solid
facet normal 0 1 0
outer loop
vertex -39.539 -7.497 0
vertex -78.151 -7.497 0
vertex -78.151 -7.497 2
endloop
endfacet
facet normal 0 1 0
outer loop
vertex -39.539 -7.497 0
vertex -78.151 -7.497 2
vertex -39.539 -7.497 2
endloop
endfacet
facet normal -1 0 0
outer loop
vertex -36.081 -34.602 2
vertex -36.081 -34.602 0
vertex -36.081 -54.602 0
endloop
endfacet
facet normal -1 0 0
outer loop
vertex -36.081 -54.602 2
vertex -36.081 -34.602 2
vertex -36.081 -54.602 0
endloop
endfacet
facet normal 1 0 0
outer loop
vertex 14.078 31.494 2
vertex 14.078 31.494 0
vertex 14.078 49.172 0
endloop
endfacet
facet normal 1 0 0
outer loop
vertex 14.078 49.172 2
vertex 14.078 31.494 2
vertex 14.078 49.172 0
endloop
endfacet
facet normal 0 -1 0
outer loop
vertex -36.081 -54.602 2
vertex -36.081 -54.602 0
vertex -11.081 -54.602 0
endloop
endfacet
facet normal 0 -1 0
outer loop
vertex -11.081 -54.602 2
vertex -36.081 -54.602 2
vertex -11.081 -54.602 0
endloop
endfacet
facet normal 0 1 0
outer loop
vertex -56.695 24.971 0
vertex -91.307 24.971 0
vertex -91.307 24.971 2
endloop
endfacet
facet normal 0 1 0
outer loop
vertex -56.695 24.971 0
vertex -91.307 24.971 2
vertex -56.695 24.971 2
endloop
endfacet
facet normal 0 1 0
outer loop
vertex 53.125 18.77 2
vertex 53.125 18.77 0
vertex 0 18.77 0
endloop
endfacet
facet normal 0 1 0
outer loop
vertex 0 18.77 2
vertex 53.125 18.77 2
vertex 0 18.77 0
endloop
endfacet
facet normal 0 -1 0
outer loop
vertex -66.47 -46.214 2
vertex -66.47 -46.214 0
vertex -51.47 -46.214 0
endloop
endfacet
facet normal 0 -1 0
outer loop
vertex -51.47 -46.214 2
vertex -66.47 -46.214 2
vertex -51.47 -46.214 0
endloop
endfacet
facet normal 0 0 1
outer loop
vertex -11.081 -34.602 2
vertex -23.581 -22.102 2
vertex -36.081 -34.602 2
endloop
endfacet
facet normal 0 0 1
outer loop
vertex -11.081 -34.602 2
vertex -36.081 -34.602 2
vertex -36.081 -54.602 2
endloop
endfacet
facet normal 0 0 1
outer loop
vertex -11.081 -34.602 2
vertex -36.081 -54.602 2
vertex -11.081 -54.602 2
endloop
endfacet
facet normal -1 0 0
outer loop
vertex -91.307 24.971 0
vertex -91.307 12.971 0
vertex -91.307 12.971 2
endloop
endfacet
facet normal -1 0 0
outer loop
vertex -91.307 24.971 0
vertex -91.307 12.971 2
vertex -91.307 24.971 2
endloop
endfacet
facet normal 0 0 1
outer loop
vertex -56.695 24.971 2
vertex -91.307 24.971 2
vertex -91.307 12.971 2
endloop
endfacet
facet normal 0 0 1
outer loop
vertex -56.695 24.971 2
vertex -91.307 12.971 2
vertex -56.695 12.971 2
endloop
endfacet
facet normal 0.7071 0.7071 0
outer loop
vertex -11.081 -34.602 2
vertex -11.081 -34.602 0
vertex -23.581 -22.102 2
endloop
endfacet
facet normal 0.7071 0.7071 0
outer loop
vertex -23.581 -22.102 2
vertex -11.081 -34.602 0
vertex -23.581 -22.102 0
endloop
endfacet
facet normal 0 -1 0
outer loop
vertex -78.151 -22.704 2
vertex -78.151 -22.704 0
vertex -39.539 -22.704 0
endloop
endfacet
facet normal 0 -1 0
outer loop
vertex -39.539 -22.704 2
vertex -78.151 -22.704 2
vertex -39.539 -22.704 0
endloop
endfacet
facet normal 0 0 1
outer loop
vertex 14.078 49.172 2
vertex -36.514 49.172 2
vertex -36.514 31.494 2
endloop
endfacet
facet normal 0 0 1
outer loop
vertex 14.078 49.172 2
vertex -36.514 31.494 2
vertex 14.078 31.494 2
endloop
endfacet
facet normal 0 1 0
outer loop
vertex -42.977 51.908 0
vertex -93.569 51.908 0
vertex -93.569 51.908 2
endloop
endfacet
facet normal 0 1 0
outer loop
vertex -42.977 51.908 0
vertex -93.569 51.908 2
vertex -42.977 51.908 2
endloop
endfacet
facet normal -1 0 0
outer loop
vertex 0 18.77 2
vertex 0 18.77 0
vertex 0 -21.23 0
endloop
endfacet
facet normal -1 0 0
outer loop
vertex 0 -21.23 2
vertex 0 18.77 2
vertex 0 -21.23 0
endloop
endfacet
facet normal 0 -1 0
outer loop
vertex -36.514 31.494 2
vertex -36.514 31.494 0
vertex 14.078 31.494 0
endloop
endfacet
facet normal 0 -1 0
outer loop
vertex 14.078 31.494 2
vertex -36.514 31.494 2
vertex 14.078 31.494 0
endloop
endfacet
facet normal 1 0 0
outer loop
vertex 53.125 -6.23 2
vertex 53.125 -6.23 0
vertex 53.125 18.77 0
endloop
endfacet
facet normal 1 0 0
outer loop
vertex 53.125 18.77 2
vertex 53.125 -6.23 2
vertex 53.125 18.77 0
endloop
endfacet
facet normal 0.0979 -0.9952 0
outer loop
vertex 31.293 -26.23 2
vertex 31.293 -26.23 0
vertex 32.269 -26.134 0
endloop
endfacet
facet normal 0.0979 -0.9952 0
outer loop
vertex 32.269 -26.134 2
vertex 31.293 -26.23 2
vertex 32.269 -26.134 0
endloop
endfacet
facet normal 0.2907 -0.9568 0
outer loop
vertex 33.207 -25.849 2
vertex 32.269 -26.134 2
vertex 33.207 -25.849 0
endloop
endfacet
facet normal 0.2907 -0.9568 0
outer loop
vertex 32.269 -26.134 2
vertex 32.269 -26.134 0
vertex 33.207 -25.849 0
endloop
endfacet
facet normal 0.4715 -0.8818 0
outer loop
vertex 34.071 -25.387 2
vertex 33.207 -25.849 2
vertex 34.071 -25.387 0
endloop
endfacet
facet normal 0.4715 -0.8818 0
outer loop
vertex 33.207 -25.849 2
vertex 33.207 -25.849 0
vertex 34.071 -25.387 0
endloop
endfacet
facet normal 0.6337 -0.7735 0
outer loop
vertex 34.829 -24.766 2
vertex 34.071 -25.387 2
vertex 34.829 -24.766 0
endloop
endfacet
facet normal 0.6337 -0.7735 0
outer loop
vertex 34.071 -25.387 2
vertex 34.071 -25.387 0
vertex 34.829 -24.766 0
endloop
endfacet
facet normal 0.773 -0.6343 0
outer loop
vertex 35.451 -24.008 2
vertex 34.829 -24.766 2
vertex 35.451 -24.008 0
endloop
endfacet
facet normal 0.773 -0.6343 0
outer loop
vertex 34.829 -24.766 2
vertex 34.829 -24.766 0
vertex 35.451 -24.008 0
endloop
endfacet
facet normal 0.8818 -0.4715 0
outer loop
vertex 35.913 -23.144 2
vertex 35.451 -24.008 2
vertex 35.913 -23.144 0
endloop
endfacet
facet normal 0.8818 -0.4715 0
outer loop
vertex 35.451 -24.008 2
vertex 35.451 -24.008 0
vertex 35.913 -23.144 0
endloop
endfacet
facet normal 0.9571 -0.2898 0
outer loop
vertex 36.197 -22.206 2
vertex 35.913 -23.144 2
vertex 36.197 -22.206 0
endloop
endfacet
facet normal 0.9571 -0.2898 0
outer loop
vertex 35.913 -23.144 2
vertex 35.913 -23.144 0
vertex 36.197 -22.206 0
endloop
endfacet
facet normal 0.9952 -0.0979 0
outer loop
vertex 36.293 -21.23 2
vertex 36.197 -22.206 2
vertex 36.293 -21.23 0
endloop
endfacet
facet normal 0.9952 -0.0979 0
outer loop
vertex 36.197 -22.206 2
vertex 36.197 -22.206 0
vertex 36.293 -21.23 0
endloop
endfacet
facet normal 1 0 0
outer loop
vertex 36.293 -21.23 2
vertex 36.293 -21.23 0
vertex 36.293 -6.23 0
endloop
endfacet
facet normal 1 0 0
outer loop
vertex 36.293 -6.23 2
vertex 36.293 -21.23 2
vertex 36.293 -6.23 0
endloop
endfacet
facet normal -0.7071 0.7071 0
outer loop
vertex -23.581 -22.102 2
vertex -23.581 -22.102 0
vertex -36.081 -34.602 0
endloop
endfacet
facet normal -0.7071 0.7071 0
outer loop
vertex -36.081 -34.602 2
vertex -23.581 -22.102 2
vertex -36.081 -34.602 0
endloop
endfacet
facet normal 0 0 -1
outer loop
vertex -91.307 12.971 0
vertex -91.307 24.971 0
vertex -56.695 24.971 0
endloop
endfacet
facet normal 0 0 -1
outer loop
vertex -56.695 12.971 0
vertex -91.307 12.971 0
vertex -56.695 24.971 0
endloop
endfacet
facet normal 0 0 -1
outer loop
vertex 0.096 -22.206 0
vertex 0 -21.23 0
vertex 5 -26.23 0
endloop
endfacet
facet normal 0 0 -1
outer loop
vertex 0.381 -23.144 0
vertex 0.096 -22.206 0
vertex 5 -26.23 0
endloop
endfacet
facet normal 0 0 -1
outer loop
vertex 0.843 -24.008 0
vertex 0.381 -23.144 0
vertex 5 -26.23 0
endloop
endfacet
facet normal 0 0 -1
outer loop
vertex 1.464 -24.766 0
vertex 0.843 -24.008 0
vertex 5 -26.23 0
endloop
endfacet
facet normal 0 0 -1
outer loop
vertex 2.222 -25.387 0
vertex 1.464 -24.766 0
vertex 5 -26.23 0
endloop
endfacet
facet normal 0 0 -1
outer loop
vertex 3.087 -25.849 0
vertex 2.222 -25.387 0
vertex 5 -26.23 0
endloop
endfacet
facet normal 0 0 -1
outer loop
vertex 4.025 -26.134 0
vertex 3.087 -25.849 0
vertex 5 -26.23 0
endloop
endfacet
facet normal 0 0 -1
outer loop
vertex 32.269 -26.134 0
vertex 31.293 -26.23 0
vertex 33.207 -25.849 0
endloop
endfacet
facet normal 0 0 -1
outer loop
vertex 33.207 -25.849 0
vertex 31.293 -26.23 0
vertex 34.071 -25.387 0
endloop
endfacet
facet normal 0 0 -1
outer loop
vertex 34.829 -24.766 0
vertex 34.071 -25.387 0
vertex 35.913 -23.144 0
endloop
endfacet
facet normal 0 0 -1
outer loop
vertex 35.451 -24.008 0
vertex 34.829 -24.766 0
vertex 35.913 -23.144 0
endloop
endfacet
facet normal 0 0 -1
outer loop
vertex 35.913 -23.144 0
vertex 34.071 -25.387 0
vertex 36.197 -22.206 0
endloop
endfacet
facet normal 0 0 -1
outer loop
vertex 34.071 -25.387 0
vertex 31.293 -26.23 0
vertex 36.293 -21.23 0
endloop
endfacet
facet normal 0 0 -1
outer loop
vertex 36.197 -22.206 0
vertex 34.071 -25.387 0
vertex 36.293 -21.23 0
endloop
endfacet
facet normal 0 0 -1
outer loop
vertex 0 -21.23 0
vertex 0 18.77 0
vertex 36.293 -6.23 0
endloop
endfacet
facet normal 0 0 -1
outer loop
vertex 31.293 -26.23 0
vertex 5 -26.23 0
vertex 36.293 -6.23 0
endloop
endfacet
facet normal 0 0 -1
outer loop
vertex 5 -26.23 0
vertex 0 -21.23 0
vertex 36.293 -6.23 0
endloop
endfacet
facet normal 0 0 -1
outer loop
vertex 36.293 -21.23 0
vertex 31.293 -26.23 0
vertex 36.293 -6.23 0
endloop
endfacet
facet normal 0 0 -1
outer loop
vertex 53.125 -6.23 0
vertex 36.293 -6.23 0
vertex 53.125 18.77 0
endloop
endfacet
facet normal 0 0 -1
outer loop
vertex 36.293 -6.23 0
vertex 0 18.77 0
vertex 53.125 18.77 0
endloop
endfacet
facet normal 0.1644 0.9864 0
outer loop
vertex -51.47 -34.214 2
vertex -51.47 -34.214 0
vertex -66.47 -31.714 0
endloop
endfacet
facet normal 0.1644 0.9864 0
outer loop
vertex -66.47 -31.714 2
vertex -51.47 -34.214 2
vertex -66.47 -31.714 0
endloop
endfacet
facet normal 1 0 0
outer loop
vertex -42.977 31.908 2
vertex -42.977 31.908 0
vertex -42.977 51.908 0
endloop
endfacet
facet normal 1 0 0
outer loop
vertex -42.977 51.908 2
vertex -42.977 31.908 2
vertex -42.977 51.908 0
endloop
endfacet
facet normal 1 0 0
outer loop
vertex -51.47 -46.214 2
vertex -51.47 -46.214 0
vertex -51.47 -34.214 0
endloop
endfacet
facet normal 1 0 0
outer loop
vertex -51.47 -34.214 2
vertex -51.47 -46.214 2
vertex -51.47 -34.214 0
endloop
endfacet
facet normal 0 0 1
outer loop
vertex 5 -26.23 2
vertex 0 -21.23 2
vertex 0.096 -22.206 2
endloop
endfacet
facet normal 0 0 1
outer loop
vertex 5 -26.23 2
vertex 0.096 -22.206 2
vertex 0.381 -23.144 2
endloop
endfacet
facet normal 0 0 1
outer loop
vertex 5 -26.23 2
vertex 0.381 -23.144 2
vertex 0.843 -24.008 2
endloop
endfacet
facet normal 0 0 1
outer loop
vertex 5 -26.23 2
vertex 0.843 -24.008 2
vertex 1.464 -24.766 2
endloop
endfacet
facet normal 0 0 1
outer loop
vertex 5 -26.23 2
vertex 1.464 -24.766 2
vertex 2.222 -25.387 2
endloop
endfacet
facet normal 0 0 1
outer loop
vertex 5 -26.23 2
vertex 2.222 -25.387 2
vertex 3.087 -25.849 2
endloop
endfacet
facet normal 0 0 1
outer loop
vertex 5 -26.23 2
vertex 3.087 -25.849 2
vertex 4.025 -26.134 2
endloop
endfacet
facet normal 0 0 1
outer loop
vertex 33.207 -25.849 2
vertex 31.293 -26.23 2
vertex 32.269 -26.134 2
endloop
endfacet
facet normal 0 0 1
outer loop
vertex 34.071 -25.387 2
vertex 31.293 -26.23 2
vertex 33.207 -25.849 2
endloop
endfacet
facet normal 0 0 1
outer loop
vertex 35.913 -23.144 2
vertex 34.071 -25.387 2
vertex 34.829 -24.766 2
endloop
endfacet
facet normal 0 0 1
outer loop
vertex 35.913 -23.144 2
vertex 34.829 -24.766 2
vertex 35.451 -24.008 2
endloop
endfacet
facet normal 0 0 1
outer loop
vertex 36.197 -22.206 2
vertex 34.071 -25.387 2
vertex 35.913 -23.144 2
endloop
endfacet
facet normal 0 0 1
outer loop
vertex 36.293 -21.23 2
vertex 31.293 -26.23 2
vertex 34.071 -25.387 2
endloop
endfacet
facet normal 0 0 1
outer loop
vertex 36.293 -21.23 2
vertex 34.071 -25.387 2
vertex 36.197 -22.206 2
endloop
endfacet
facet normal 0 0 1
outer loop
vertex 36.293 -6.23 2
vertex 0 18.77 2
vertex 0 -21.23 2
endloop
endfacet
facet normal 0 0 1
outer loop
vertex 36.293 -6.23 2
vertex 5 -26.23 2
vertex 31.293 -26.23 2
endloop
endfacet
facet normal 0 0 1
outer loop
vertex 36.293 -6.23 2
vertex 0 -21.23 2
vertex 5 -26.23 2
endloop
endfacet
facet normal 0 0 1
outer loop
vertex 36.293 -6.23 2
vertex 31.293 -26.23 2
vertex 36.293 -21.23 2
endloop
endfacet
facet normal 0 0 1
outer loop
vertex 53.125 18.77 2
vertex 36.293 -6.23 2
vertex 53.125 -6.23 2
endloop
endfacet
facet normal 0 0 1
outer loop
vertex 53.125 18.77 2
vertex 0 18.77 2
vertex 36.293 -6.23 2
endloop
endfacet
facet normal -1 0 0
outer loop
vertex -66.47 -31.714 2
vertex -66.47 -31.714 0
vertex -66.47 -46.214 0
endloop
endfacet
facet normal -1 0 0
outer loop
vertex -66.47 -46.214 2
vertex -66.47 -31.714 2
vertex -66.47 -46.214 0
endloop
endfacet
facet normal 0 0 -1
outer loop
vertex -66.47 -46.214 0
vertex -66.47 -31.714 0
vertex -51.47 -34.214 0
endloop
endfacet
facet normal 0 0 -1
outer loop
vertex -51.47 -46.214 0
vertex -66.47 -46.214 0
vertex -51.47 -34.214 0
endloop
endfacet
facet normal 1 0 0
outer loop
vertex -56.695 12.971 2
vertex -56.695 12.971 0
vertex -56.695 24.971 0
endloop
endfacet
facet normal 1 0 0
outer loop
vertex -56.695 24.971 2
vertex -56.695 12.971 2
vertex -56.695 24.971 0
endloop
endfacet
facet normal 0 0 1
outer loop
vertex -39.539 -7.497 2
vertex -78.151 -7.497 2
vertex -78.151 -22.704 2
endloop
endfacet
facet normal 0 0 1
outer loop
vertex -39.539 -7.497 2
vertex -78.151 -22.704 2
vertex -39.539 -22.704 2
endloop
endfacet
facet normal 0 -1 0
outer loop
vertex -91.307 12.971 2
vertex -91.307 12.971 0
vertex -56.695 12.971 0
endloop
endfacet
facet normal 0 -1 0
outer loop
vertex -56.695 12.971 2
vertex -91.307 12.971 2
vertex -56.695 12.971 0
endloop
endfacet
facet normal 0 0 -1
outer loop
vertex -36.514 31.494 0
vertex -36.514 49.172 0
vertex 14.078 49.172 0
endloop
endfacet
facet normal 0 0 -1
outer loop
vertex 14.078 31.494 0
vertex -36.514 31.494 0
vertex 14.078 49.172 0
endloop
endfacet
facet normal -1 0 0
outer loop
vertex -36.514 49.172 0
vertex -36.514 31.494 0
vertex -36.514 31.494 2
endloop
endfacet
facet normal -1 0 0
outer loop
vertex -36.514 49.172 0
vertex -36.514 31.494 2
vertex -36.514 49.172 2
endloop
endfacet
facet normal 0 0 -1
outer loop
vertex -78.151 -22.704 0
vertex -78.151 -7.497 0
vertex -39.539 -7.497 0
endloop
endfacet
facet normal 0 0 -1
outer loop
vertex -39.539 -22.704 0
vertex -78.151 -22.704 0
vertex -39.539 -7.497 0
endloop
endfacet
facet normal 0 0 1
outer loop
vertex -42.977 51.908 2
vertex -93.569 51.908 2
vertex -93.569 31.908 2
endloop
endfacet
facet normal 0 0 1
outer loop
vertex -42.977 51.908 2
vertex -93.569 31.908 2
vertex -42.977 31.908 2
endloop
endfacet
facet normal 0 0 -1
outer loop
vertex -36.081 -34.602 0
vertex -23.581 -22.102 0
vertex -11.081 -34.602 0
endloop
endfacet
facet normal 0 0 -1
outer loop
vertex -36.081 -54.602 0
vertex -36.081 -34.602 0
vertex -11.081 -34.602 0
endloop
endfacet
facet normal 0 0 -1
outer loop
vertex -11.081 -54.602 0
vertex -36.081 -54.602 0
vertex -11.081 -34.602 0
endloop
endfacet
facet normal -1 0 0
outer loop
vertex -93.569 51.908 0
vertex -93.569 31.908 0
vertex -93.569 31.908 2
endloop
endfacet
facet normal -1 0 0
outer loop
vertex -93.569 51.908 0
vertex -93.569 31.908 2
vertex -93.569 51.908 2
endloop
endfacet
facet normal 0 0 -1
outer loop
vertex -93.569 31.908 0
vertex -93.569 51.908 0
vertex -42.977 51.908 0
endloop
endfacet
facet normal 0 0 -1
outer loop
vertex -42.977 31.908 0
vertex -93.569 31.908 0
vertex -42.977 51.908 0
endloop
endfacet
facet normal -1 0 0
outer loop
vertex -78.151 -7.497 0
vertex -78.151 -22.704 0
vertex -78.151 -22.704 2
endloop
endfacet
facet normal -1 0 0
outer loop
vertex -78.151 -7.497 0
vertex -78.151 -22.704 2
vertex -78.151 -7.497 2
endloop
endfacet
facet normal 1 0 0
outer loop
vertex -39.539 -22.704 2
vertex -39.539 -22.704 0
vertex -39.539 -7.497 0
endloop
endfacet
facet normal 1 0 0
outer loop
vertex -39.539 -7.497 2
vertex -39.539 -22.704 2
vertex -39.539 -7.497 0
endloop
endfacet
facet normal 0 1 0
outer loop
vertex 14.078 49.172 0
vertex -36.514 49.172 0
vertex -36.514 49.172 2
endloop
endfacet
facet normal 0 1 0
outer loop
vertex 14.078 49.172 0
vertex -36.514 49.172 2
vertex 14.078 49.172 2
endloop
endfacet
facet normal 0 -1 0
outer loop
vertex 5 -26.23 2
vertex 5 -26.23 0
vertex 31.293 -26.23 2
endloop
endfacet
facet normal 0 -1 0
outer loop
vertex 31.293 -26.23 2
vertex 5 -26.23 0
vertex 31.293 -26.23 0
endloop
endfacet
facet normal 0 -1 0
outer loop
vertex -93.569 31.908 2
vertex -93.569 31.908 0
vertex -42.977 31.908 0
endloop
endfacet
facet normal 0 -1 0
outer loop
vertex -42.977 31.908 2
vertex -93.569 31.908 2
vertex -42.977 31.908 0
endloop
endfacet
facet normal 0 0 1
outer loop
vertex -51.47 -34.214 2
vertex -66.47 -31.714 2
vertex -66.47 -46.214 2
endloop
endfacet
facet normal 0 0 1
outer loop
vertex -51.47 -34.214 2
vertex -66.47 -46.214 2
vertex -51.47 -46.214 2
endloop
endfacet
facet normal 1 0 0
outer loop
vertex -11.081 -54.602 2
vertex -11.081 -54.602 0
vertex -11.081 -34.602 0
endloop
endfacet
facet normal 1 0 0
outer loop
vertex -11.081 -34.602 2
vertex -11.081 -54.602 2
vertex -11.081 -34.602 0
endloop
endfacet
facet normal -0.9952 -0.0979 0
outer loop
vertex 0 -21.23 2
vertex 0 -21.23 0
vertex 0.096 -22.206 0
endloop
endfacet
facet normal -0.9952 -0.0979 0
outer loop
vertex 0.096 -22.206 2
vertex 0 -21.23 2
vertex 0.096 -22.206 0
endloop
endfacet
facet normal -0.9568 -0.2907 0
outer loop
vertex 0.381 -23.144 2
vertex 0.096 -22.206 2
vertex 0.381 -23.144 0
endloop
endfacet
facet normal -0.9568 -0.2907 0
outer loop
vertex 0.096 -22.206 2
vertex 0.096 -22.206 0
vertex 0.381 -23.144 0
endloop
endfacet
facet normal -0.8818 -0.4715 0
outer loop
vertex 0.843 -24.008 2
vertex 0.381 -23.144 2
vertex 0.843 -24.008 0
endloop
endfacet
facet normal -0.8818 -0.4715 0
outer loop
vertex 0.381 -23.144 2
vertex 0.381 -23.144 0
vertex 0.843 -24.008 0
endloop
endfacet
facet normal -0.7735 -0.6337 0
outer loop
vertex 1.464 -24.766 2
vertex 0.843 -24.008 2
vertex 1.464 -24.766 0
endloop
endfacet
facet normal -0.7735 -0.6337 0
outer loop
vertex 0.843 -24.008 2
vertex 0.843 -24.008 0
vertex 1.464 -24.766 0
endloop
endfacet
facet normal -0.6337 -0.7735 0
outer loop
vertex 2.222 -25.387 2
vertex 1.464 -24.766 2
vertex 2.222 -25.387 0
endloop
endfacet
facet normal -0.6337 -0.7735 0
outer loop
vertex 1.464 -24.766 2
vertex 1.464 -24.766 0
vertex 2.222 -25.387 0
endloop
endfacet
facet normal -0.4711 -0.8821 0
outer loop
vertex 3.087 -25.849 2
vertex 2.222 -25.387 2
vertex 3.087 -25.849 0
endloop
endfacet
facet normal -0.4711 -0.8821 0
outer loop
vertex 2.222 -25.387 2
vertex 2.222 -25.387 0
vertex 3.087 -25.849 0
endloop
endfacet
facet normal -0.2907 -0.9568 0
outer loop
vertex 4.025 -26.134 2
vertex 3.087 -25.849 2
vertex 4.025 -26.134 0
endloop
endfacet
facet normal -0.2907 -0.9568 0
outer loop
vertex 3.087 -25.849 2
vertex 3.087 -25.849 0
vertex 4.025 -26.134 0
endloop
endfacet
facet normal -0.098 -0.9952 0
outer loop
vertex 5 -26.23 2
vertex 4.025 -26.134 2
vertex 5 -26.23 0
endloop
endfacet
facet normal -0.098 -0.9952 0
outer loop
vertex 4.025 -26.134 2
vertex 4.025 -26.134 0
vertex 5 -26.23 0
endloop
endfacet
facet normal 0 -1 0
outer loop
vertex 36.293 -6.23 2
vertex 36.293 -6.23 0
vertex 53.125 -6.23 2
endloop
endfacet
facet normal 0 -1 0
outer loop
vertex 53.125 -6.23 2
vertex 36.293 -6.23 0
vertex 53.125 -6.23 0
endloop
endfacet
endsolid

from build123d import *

# Parameters (mm, degrees)
F0_W      = 50.592
F0_H      = 20
F1_DEPTH  = 2
F2_W      = 34.612
F2_H      = 12
F3_DEPTH  = 2
F4_W      = 50.592
F4_H      = 17.678
F5_DEPTH  = 2
F7_DEPTH  = 2
F8_W      = 38.612
F8_H      = 15.207
F10_DEPTH = 2
F9_W      = 15
F9_H      = 12
F11_DEPTH = 2
F13_DEPTH = 2


with BuildPart() as f1:
    # F0 (on Top) → F1 (new body)
    with BuildSketch(Plane.XY):
        with Locations((-68.272908, 41.908363)):
            Rectangle(F0_W, F0_H)
    extrude(amount=F1_DEPTH)


with BuildPart() as f3:
    # F2 (on Top) → F3 (new body)
    with BuildSketch(Plane.XY):
        with Locations((-74.001385, 18.971444)):
            Rectangle(F2_W, F2_H)
    extrude(amount=F3_DEPTH)


with BuildPart() as f5:
    # F4 (on Top) → F5 (new body)
    with BuildSketch(Plane.XY):
        with Locations((-11.217898, 40.332941)):
            Rectangle(F4_W, F4_H)
    extrude(amount=F5_DEPTH)


with BuildPart() as f7:
    # F6 (on Top) → F7 (new body)
    with BuildSketch(Plane.XY):
        Polygon((53.125003, 18.769916), (0, 18.769916), (0, -6.230084), (36.293197, -6.230084), (53.125003, -6.230084), align=None)
        with BuildLine():
            Line((36.293197, -6.230084), (0, -6.230084))
            Line((0, -6.230084), (0, -21.230084))
            ThreePointArc((0, -21.230084), (1.464466, -24.765618), (5, -26.230084))
            Line((5, -26.230084), (31.293197, -26.230084))
            ThreePointArc((31.293197, -26.230084), (34.828731, -24.765618), (36.293197, -21.230084))
            Line((36.293197, -21.230084), (36.293197, -6.230084))
        make_face()
    extrude(amount=F7_DEPTH)


with BuildPart() as f10:
    # F8 (on Top) → F10 (new body)
    with BuildSketch(Plane.XY):
        with Locations((-58.845443, -15.100516)):
            Rectangle(F8_W, F8_H)
    extrude(amount=F10_DEPTH)


with BuildPart() as f11:
    # F9 (on Top) → F11 (new body)
    with BuildSketch(Plane.XY):
        Polygon((-66.470021, -31.714223), (-66.470021, -34.214223), (-51.470021, -34.214223), align=None)
        with Locations((-58.970021, -40.214223)):
            Rectangle(F9_W, F9_H)
    extrude(amount=F11_DEPTH)


with BuildPart() as f13:
    # F12 (on Top) → F13 (new body)
    with BuildSketch(Plane.XY):
        Polygon((-23.580812, -22.101955), (-36.080812, -34.601955), (-23.580812, -34.601955), (-11.080812, -34.601955), align=None)
        Polygon((-23.580812, -34.601955), (-36.080812, -34.601955), (-36.080812, -54.601955), (-11.080812, -54.601955), (-11.080812, -34.601955), align=None)
    extrude(amount=F13_DEPTH)


solid = Compound([f1.part, f3.part, f5.part, f7.part, f10.part, f11.part, f13.part])
